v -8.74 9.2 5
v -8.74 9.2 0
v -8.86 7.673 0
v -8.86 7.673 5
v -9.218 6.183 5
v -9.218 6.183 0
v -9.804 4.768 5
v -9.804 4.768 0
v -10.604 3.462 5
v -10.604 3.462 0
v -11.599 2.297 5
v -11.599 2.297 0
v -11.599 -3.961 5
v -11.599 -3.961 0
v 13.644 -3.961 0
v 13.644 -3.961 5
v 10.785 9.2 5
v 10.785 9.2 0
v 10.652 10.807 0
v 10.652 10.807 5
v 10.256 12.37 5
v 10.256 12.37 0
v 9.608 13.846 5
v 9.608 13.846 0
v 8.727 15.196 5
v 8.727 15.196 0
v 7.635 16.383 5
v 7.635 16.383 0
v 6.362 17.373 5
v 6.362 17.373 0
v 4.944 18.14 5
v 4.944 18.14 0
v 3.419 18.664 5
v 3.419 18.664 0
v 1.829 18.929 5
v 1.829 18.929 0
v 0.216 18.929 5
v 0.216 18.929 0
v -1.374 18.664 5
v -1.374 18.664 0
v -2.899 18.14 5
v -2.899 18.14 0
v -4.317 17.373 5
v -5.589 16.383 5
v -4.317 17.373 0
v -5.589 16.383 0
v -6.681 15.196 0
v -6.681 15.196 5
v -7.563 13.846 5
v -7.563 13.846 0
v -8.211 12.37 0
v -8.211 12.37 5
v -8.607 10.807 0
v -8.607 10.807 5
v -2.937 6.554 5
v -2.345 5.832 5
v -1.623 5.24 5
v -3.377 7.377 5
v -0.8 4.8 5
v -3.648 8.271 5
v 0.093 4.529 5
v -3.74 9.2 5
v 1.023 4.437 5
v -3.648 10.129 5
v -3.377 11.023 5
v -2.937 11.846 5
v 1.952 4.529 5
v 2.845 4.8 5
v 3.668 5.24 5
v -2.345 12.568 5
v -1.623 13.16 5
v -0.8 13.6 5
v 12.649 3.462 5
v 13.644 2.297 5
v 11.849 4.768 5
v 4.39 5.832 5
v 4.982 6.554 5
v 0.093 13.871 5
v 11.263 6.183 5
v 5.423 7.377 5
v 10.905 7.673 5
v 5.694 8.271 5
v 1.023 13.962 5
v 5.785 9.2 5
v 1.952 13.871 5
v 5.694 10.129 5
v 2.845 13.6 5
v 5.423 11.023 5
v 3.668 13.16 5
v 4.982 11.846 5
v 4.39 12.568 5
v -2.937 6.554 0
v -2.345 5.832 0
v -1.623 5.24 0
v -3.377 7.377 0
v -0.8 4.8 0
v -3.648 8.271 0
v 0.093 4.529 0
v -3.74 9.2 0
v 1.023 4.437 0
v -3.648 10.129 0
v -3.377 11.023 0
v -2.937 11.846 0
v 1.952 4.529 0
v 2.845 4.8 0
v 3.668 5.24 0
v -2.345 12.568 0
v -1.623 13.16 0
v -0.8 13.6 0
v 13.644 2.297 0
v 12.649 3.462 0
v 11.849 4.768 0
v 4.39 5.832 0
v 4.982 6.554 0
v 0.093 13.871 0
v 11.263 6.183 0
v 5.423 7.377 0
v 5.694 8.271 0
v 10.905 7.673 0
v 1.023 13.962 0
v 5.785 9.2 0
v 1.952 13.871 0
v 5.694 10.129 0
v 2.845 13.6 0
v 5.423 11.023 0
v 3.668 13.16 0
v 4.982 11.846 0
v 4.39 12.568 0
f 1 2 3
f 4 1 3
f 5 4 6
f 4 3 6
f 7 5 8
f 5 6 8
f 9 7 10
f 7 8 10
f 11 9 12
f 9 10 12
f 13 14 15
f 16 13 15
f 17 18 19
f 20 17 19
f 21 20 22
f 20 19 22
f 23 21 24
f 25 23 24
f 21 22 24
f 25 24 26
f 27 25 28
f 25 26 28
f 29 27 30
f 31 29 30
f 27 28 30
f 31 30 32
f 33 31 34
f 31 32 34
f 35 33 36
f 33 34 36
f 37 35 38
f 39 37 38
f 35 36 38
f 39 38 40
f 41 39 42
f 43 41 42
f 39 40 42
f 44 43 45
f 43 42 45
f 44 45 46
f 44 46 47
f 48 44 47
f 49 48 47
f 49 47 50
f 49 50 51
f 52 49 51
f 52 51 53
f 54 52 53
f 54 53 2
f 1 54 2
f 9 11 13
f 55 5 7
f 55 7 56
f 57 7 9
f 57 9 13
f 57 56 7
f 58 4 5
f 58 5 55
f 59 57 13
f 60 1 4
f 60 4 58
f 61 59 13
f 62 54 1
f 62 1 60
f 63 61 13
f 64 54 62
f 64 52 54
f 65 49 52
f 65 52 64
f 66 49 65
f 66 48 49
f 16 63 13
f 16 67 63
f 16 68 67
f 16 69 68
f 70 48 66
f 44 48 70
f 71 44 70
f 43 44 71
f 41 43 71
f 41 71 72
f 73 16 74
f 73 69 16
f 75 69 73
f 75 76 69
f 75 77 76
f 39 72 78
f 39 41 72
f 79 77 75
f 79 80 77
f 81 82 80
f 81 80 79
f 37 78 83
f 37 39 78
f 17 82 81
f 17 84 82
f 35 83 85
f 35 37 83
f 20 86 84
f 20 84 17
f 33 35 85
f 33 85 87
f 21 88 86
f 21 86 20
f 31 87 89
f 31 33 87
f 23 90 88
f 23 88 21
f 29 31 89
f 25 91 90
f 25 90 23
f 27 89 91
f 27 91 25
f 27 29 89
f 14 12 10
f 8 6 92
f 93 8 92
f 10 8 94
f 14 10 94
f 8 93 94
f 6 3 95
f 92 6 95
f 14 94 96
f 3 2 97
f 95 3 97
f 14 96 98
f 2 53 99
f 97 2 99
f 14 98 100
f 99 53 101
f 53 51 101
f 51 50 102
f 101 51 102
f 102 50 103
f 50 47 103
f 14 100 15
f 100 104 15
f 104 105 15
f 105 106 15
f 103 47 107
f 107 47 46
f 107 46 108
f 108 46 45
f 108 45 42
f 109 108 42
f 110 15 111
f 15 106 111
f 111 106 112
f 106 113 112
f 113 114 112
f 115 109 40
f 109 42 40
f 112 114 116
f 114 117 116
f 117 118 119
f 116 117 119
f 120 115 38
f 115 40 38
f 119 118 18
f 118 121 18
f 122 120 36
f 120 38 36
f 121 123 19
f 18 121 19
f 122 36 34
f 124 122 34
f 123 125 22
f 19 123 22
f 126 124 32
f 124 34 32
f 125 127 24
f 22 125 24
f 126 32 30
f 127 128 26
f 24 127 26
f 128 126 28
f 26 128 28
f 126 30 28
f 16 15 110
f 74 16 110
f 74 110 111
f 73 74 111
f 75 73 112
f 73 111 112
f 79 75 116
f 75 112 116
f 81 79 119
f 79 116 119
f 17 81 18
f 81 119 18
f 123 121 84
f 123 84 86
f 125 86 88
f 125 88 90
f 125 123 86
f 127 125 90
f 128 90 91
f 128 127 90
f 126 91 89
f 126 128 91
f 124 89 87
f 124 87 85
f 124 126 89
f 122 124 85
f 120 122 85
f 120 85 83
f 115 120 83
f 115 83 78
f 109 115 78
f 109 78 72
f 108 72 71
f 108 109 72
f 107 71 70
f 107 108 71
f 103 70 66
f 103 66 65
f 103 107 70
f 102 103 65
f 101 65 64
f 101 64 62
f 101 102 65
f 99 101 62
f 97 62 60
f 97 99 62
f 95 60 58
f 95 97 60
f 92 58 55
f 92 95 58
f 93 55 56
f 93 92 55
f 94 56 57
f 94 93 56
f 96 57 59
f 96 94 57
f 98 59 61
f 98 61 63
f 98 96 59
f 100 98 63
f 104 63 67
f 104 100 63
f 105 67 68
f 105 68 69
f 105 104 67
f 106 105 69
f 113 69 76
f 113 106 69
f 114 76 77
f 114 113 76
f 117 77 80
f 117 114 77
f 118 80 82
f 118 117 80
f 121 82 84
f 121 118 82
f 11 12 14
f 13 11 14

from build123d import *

# Parameters (mm, degrees)
SKETCH1_R           = 4.7625
BOSS_EXTRUDE1_DEPTH = 5


with BuildPart() as part:
    # Sketch1 → Boss-Extrude1 (new body)
    with BuildSketch(Plane.XY):
        with BuildLine():
            Line((-11.599180508, 2.297223602), (-11.599180508, -0.562353553))
            Line((-11.599180508, -0.562353553), (-11.599180508, -3.961142474))
            Line((-11.599180508, -3.961142474), (13.644266696, -3.961142474))
            Line((13.644266696, -3.961142474), (13.644266696, -0.562353553))
            Line((13.644266696, -0.562353553), (13.644266696, 2.297223602))
            ThreePointArc((13.644266696, 2.297223602), (11.528131098, 5.464244333), (10.785043094, 9.2))
            ThreePointArc((10.785043094, 9.2), (1.022543094, 18.9625), (-8.739956906, 9.2))
            ThreePointArc((-8.739956906, 9.2), (-9.48304491, 5.464244333), (-11.599180508, 2.297223602))
        make_face()
        with Locations((1.022543094, 9.2)):
            Circle(SKETCH1_R, mode=Mode.SUBTRACT)
    extrude(amount=BOSS_EXTRUDE1_DEPTH)


solid = part.part
